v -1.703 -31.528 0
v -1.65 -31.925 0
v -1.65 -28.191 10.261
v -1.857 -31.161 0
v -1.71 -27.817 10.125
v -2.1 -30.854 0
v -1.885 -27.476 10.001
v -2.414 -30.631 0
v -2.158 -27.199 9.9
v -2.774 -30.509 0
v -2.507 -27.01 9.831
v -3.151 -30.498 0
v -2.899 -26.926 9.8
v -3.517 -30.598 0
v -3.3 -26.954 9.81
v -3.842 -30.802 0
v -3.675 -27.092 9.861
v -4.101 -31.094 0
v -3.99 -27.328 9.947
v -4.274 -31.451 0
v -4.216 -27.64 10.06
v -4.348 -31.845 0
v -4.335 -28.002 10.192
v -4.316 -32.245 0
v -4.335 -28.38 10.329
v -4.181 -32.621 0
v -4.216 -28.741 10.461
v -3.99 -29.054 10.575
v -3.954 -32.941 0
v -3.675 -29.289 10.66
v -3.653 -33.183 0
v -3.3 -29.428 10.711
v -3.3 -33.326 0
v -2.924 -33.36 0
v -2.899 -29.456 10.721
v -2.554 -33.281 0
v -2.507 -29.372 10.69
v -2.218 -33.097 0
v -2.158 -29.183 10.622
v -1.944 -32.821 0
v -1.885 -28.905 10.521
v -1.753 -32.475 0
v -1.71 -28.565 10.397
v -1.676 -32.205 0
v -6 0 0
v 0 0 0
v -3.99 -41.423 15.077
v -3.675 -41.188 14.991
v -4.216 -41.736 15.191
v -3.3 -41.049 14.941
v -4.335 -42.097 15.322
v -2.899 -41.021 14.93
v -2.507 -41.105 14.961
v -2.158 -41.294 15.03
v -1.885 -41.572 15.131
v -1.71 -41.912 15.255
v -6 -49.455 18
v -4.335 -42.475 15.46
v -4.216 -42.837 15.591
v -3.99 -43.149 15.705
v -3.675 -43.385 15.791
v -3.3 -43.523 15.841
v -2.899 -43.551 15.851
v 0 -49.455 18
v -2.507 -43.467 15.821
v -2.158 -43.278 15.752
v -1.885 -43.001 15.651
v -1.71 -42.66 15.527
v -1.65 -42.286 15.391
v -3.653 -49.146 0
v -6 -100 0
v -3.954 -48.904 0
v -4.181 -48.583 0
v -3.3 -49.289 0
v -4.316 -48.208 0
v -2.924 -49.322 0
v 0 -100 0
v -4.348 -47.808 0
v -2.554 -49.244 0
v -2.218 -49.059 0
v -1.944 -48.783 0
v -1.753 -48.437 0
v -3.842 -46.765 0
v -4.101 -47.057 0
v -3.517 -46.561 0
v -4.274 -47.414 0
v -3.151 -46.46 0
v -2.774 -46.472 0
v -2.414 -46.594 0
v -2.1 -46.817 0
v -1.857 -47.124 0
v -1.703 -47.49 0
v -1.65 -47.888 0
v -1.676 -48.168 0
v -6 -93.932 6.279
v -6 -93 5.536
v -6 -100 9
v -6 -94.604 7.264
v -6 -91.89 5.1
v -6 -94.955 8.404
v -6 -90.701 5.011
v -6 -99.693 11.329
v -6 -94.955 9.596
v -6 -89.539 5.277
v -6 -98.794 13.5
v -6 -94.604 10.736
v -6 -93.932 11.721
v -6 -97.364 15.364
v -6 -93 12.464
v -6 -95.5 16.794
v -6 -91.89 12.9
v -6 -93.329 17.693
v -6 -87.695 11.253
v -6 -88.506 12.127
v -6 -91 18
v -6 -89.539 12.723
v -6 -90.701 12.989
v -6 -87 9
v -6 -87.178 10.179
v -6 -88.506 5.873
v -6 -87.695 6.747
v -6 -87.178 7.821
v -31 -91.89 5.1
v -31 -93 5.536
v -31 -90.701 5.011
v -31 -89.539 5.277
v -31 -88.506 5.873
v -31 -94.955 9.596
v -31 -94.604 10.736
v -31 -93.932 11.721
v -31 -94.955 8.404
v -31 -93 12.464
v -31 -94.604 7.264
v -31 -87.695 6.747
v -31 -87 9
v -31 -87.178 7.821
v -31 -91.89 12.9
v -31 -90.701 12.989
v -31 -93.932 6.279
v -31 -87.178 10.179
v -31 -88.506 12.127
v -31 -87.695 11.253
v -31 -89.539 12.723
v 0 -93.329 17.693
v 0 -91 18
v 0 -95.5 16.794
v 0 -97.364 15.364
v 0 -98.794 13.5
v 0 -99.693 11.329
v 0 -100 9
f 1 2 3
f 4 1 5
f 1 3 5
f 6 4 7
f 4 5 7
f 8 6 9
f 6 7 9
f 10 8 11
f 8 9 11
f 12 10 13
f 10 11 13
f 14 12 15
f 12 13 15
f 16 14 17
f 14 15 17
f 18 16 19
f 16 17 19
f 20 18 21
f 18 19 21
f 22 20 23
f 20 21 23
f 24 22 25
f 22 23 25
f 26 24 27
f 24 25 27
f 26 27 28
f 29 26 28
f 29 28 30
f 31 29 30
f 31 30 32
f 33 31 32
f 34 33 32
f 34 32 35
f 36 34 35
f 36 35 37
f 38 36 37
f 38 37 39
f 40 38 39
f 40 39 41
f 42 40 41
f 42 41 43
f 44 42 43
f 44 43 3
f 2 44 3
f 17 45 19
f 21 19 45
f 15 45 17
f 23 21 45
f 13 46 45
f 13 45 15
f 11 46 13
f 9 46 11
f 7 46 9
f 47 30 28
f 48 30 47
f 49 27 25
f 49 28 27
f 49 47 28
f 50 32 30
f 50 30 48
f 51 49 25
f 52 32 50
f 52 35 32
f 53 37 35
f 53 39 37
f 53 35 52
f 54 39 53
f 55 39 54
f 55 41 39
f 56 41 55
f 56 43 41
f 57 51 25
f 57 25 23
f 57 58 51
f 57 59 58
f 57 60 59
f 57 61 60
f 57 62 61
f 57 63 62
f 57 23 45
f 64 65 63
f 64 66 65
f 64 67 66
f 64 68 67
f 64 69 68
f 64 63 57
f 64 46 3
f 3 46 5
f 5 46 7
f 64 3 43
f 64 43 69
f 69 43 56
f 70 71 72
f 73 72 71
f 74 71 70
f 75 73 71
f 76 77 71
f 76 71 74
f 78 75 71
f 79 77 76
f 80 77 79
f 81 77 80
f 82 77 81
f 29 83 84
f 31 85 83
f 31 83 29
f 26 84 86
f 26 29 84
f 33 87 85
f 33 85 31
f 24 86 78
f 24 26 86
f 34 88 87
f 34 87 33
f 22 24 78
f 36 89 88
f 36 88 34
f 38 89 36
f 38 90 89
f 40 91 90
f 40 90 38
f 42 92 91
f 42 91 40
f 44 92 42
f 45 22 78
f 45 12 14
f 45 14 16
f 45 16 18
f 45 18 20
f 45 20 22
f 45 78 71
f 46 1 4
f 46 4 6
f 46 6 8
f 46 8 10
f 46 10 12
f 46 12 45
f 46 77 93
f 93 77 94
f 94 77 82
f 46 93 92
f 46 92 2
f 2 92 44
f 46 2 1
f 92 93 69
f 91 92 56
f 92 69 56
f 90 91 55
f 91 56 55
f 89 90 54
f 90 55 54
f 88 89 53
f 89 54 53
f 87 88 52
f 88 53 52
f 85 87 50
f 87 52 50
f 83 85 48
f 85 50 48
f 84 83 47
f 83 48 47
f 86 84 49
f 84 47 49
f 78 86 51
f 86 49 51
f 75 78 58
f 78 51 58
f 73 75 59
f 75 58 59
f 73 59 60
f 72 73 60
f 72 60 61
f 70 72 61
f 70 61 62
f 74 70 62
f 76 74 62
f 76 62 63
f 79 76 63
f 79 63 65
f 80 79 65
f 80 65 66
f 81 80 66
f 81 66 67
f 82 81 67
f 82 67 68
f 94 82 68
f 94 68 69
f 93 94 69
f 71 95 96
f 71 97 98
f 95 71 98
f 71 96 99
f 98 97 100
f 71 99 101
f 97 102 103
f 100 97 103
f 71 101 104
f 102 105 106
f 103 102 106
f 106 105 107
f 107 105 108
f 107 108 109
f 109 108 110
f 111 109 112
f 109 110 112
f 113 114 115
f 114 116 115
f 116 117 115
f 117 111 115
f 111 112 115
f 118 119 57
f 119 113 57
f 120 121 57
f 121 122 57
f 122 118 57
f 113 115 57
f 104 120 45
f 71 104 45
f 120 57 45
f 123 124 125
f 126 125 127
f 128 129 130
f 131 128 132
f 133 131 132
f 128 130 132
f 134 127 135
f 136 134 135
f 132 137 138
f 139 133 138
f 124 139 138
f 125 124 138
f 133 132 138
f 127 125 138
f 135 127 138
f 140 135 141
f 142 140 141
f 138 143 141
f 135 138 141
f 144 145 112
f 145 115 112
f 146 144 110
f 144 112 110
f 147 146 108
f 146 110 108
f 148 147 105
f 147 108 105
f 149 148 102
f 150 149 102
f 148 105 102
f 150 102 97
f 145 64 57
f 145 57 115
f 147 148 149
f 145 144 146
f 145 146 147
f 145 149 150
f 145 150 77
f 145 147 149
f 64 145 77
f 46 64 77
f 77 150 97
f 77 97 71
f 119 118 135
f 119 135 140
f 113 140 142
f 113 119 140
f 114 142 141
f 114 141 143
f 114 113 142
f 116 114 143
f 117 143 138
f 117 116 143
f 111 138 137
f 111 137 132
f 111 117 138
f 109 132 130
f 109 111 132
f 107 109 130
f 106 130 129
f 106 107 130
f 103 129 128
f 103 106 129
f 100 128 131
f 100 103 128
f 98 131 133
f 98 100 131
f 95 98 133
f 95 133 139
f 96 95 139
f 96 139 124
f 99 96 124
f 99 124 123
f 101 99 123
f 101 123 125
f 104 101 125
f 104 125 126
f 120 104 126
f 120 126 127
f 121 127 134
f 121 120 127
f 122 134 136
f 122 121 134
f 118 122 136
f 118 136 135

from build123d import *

# Parameters (mm, degrees)
F1_DEPTH = 6
F2_R     = 9
F3_R     = 4
F4_DEPTH = 25
F7_R     = 1.35
F8_DEPTH = 25


with BuildPart() as f1:
    # F0 (on Right) → F1 (new body)
    with BuildSketch(Plane.YZ):
        Polygon((-100, 0), (0, 0), (-49.4545935502, 18), (-100, 18), align=None)
    extrude(amount=F1_DEPTH)

    # F2
    f2_edges = [f1.edges().sort_by_distance(p)[0] for p in [
        (3, -100, 18),
    ]]
    fillet(f2_edges, radius=F2_R)

    # F3 (on face) → F4 (join)
    with BuildSketch(Plane.YZ.offset(6)):
        with Locations((-91, 9)):
            Circle(F3_R)
    extrude(amount=F4_DEPTH)


with BuildPart() as f5_1:
    # F5: instance of F1
    add(f1.part.mirror(Plane.YZ))

    # F7 (on face) → F8 (cut)
    with BuildSketch(Plane(origin=(0, 0, 0), x_dir=(1, 0, 0), z_dir=(0, 0.3420201433, 0.9396926208))):
        with Locations((-3, -45)):
            Circle(F7_R)
        with Locations((-3, -30)):
            Circle(F7_R)
    extrude(amount=-F8_DEPTH, mode=Mode.SUBTRACT)


solid = f5_1.part
